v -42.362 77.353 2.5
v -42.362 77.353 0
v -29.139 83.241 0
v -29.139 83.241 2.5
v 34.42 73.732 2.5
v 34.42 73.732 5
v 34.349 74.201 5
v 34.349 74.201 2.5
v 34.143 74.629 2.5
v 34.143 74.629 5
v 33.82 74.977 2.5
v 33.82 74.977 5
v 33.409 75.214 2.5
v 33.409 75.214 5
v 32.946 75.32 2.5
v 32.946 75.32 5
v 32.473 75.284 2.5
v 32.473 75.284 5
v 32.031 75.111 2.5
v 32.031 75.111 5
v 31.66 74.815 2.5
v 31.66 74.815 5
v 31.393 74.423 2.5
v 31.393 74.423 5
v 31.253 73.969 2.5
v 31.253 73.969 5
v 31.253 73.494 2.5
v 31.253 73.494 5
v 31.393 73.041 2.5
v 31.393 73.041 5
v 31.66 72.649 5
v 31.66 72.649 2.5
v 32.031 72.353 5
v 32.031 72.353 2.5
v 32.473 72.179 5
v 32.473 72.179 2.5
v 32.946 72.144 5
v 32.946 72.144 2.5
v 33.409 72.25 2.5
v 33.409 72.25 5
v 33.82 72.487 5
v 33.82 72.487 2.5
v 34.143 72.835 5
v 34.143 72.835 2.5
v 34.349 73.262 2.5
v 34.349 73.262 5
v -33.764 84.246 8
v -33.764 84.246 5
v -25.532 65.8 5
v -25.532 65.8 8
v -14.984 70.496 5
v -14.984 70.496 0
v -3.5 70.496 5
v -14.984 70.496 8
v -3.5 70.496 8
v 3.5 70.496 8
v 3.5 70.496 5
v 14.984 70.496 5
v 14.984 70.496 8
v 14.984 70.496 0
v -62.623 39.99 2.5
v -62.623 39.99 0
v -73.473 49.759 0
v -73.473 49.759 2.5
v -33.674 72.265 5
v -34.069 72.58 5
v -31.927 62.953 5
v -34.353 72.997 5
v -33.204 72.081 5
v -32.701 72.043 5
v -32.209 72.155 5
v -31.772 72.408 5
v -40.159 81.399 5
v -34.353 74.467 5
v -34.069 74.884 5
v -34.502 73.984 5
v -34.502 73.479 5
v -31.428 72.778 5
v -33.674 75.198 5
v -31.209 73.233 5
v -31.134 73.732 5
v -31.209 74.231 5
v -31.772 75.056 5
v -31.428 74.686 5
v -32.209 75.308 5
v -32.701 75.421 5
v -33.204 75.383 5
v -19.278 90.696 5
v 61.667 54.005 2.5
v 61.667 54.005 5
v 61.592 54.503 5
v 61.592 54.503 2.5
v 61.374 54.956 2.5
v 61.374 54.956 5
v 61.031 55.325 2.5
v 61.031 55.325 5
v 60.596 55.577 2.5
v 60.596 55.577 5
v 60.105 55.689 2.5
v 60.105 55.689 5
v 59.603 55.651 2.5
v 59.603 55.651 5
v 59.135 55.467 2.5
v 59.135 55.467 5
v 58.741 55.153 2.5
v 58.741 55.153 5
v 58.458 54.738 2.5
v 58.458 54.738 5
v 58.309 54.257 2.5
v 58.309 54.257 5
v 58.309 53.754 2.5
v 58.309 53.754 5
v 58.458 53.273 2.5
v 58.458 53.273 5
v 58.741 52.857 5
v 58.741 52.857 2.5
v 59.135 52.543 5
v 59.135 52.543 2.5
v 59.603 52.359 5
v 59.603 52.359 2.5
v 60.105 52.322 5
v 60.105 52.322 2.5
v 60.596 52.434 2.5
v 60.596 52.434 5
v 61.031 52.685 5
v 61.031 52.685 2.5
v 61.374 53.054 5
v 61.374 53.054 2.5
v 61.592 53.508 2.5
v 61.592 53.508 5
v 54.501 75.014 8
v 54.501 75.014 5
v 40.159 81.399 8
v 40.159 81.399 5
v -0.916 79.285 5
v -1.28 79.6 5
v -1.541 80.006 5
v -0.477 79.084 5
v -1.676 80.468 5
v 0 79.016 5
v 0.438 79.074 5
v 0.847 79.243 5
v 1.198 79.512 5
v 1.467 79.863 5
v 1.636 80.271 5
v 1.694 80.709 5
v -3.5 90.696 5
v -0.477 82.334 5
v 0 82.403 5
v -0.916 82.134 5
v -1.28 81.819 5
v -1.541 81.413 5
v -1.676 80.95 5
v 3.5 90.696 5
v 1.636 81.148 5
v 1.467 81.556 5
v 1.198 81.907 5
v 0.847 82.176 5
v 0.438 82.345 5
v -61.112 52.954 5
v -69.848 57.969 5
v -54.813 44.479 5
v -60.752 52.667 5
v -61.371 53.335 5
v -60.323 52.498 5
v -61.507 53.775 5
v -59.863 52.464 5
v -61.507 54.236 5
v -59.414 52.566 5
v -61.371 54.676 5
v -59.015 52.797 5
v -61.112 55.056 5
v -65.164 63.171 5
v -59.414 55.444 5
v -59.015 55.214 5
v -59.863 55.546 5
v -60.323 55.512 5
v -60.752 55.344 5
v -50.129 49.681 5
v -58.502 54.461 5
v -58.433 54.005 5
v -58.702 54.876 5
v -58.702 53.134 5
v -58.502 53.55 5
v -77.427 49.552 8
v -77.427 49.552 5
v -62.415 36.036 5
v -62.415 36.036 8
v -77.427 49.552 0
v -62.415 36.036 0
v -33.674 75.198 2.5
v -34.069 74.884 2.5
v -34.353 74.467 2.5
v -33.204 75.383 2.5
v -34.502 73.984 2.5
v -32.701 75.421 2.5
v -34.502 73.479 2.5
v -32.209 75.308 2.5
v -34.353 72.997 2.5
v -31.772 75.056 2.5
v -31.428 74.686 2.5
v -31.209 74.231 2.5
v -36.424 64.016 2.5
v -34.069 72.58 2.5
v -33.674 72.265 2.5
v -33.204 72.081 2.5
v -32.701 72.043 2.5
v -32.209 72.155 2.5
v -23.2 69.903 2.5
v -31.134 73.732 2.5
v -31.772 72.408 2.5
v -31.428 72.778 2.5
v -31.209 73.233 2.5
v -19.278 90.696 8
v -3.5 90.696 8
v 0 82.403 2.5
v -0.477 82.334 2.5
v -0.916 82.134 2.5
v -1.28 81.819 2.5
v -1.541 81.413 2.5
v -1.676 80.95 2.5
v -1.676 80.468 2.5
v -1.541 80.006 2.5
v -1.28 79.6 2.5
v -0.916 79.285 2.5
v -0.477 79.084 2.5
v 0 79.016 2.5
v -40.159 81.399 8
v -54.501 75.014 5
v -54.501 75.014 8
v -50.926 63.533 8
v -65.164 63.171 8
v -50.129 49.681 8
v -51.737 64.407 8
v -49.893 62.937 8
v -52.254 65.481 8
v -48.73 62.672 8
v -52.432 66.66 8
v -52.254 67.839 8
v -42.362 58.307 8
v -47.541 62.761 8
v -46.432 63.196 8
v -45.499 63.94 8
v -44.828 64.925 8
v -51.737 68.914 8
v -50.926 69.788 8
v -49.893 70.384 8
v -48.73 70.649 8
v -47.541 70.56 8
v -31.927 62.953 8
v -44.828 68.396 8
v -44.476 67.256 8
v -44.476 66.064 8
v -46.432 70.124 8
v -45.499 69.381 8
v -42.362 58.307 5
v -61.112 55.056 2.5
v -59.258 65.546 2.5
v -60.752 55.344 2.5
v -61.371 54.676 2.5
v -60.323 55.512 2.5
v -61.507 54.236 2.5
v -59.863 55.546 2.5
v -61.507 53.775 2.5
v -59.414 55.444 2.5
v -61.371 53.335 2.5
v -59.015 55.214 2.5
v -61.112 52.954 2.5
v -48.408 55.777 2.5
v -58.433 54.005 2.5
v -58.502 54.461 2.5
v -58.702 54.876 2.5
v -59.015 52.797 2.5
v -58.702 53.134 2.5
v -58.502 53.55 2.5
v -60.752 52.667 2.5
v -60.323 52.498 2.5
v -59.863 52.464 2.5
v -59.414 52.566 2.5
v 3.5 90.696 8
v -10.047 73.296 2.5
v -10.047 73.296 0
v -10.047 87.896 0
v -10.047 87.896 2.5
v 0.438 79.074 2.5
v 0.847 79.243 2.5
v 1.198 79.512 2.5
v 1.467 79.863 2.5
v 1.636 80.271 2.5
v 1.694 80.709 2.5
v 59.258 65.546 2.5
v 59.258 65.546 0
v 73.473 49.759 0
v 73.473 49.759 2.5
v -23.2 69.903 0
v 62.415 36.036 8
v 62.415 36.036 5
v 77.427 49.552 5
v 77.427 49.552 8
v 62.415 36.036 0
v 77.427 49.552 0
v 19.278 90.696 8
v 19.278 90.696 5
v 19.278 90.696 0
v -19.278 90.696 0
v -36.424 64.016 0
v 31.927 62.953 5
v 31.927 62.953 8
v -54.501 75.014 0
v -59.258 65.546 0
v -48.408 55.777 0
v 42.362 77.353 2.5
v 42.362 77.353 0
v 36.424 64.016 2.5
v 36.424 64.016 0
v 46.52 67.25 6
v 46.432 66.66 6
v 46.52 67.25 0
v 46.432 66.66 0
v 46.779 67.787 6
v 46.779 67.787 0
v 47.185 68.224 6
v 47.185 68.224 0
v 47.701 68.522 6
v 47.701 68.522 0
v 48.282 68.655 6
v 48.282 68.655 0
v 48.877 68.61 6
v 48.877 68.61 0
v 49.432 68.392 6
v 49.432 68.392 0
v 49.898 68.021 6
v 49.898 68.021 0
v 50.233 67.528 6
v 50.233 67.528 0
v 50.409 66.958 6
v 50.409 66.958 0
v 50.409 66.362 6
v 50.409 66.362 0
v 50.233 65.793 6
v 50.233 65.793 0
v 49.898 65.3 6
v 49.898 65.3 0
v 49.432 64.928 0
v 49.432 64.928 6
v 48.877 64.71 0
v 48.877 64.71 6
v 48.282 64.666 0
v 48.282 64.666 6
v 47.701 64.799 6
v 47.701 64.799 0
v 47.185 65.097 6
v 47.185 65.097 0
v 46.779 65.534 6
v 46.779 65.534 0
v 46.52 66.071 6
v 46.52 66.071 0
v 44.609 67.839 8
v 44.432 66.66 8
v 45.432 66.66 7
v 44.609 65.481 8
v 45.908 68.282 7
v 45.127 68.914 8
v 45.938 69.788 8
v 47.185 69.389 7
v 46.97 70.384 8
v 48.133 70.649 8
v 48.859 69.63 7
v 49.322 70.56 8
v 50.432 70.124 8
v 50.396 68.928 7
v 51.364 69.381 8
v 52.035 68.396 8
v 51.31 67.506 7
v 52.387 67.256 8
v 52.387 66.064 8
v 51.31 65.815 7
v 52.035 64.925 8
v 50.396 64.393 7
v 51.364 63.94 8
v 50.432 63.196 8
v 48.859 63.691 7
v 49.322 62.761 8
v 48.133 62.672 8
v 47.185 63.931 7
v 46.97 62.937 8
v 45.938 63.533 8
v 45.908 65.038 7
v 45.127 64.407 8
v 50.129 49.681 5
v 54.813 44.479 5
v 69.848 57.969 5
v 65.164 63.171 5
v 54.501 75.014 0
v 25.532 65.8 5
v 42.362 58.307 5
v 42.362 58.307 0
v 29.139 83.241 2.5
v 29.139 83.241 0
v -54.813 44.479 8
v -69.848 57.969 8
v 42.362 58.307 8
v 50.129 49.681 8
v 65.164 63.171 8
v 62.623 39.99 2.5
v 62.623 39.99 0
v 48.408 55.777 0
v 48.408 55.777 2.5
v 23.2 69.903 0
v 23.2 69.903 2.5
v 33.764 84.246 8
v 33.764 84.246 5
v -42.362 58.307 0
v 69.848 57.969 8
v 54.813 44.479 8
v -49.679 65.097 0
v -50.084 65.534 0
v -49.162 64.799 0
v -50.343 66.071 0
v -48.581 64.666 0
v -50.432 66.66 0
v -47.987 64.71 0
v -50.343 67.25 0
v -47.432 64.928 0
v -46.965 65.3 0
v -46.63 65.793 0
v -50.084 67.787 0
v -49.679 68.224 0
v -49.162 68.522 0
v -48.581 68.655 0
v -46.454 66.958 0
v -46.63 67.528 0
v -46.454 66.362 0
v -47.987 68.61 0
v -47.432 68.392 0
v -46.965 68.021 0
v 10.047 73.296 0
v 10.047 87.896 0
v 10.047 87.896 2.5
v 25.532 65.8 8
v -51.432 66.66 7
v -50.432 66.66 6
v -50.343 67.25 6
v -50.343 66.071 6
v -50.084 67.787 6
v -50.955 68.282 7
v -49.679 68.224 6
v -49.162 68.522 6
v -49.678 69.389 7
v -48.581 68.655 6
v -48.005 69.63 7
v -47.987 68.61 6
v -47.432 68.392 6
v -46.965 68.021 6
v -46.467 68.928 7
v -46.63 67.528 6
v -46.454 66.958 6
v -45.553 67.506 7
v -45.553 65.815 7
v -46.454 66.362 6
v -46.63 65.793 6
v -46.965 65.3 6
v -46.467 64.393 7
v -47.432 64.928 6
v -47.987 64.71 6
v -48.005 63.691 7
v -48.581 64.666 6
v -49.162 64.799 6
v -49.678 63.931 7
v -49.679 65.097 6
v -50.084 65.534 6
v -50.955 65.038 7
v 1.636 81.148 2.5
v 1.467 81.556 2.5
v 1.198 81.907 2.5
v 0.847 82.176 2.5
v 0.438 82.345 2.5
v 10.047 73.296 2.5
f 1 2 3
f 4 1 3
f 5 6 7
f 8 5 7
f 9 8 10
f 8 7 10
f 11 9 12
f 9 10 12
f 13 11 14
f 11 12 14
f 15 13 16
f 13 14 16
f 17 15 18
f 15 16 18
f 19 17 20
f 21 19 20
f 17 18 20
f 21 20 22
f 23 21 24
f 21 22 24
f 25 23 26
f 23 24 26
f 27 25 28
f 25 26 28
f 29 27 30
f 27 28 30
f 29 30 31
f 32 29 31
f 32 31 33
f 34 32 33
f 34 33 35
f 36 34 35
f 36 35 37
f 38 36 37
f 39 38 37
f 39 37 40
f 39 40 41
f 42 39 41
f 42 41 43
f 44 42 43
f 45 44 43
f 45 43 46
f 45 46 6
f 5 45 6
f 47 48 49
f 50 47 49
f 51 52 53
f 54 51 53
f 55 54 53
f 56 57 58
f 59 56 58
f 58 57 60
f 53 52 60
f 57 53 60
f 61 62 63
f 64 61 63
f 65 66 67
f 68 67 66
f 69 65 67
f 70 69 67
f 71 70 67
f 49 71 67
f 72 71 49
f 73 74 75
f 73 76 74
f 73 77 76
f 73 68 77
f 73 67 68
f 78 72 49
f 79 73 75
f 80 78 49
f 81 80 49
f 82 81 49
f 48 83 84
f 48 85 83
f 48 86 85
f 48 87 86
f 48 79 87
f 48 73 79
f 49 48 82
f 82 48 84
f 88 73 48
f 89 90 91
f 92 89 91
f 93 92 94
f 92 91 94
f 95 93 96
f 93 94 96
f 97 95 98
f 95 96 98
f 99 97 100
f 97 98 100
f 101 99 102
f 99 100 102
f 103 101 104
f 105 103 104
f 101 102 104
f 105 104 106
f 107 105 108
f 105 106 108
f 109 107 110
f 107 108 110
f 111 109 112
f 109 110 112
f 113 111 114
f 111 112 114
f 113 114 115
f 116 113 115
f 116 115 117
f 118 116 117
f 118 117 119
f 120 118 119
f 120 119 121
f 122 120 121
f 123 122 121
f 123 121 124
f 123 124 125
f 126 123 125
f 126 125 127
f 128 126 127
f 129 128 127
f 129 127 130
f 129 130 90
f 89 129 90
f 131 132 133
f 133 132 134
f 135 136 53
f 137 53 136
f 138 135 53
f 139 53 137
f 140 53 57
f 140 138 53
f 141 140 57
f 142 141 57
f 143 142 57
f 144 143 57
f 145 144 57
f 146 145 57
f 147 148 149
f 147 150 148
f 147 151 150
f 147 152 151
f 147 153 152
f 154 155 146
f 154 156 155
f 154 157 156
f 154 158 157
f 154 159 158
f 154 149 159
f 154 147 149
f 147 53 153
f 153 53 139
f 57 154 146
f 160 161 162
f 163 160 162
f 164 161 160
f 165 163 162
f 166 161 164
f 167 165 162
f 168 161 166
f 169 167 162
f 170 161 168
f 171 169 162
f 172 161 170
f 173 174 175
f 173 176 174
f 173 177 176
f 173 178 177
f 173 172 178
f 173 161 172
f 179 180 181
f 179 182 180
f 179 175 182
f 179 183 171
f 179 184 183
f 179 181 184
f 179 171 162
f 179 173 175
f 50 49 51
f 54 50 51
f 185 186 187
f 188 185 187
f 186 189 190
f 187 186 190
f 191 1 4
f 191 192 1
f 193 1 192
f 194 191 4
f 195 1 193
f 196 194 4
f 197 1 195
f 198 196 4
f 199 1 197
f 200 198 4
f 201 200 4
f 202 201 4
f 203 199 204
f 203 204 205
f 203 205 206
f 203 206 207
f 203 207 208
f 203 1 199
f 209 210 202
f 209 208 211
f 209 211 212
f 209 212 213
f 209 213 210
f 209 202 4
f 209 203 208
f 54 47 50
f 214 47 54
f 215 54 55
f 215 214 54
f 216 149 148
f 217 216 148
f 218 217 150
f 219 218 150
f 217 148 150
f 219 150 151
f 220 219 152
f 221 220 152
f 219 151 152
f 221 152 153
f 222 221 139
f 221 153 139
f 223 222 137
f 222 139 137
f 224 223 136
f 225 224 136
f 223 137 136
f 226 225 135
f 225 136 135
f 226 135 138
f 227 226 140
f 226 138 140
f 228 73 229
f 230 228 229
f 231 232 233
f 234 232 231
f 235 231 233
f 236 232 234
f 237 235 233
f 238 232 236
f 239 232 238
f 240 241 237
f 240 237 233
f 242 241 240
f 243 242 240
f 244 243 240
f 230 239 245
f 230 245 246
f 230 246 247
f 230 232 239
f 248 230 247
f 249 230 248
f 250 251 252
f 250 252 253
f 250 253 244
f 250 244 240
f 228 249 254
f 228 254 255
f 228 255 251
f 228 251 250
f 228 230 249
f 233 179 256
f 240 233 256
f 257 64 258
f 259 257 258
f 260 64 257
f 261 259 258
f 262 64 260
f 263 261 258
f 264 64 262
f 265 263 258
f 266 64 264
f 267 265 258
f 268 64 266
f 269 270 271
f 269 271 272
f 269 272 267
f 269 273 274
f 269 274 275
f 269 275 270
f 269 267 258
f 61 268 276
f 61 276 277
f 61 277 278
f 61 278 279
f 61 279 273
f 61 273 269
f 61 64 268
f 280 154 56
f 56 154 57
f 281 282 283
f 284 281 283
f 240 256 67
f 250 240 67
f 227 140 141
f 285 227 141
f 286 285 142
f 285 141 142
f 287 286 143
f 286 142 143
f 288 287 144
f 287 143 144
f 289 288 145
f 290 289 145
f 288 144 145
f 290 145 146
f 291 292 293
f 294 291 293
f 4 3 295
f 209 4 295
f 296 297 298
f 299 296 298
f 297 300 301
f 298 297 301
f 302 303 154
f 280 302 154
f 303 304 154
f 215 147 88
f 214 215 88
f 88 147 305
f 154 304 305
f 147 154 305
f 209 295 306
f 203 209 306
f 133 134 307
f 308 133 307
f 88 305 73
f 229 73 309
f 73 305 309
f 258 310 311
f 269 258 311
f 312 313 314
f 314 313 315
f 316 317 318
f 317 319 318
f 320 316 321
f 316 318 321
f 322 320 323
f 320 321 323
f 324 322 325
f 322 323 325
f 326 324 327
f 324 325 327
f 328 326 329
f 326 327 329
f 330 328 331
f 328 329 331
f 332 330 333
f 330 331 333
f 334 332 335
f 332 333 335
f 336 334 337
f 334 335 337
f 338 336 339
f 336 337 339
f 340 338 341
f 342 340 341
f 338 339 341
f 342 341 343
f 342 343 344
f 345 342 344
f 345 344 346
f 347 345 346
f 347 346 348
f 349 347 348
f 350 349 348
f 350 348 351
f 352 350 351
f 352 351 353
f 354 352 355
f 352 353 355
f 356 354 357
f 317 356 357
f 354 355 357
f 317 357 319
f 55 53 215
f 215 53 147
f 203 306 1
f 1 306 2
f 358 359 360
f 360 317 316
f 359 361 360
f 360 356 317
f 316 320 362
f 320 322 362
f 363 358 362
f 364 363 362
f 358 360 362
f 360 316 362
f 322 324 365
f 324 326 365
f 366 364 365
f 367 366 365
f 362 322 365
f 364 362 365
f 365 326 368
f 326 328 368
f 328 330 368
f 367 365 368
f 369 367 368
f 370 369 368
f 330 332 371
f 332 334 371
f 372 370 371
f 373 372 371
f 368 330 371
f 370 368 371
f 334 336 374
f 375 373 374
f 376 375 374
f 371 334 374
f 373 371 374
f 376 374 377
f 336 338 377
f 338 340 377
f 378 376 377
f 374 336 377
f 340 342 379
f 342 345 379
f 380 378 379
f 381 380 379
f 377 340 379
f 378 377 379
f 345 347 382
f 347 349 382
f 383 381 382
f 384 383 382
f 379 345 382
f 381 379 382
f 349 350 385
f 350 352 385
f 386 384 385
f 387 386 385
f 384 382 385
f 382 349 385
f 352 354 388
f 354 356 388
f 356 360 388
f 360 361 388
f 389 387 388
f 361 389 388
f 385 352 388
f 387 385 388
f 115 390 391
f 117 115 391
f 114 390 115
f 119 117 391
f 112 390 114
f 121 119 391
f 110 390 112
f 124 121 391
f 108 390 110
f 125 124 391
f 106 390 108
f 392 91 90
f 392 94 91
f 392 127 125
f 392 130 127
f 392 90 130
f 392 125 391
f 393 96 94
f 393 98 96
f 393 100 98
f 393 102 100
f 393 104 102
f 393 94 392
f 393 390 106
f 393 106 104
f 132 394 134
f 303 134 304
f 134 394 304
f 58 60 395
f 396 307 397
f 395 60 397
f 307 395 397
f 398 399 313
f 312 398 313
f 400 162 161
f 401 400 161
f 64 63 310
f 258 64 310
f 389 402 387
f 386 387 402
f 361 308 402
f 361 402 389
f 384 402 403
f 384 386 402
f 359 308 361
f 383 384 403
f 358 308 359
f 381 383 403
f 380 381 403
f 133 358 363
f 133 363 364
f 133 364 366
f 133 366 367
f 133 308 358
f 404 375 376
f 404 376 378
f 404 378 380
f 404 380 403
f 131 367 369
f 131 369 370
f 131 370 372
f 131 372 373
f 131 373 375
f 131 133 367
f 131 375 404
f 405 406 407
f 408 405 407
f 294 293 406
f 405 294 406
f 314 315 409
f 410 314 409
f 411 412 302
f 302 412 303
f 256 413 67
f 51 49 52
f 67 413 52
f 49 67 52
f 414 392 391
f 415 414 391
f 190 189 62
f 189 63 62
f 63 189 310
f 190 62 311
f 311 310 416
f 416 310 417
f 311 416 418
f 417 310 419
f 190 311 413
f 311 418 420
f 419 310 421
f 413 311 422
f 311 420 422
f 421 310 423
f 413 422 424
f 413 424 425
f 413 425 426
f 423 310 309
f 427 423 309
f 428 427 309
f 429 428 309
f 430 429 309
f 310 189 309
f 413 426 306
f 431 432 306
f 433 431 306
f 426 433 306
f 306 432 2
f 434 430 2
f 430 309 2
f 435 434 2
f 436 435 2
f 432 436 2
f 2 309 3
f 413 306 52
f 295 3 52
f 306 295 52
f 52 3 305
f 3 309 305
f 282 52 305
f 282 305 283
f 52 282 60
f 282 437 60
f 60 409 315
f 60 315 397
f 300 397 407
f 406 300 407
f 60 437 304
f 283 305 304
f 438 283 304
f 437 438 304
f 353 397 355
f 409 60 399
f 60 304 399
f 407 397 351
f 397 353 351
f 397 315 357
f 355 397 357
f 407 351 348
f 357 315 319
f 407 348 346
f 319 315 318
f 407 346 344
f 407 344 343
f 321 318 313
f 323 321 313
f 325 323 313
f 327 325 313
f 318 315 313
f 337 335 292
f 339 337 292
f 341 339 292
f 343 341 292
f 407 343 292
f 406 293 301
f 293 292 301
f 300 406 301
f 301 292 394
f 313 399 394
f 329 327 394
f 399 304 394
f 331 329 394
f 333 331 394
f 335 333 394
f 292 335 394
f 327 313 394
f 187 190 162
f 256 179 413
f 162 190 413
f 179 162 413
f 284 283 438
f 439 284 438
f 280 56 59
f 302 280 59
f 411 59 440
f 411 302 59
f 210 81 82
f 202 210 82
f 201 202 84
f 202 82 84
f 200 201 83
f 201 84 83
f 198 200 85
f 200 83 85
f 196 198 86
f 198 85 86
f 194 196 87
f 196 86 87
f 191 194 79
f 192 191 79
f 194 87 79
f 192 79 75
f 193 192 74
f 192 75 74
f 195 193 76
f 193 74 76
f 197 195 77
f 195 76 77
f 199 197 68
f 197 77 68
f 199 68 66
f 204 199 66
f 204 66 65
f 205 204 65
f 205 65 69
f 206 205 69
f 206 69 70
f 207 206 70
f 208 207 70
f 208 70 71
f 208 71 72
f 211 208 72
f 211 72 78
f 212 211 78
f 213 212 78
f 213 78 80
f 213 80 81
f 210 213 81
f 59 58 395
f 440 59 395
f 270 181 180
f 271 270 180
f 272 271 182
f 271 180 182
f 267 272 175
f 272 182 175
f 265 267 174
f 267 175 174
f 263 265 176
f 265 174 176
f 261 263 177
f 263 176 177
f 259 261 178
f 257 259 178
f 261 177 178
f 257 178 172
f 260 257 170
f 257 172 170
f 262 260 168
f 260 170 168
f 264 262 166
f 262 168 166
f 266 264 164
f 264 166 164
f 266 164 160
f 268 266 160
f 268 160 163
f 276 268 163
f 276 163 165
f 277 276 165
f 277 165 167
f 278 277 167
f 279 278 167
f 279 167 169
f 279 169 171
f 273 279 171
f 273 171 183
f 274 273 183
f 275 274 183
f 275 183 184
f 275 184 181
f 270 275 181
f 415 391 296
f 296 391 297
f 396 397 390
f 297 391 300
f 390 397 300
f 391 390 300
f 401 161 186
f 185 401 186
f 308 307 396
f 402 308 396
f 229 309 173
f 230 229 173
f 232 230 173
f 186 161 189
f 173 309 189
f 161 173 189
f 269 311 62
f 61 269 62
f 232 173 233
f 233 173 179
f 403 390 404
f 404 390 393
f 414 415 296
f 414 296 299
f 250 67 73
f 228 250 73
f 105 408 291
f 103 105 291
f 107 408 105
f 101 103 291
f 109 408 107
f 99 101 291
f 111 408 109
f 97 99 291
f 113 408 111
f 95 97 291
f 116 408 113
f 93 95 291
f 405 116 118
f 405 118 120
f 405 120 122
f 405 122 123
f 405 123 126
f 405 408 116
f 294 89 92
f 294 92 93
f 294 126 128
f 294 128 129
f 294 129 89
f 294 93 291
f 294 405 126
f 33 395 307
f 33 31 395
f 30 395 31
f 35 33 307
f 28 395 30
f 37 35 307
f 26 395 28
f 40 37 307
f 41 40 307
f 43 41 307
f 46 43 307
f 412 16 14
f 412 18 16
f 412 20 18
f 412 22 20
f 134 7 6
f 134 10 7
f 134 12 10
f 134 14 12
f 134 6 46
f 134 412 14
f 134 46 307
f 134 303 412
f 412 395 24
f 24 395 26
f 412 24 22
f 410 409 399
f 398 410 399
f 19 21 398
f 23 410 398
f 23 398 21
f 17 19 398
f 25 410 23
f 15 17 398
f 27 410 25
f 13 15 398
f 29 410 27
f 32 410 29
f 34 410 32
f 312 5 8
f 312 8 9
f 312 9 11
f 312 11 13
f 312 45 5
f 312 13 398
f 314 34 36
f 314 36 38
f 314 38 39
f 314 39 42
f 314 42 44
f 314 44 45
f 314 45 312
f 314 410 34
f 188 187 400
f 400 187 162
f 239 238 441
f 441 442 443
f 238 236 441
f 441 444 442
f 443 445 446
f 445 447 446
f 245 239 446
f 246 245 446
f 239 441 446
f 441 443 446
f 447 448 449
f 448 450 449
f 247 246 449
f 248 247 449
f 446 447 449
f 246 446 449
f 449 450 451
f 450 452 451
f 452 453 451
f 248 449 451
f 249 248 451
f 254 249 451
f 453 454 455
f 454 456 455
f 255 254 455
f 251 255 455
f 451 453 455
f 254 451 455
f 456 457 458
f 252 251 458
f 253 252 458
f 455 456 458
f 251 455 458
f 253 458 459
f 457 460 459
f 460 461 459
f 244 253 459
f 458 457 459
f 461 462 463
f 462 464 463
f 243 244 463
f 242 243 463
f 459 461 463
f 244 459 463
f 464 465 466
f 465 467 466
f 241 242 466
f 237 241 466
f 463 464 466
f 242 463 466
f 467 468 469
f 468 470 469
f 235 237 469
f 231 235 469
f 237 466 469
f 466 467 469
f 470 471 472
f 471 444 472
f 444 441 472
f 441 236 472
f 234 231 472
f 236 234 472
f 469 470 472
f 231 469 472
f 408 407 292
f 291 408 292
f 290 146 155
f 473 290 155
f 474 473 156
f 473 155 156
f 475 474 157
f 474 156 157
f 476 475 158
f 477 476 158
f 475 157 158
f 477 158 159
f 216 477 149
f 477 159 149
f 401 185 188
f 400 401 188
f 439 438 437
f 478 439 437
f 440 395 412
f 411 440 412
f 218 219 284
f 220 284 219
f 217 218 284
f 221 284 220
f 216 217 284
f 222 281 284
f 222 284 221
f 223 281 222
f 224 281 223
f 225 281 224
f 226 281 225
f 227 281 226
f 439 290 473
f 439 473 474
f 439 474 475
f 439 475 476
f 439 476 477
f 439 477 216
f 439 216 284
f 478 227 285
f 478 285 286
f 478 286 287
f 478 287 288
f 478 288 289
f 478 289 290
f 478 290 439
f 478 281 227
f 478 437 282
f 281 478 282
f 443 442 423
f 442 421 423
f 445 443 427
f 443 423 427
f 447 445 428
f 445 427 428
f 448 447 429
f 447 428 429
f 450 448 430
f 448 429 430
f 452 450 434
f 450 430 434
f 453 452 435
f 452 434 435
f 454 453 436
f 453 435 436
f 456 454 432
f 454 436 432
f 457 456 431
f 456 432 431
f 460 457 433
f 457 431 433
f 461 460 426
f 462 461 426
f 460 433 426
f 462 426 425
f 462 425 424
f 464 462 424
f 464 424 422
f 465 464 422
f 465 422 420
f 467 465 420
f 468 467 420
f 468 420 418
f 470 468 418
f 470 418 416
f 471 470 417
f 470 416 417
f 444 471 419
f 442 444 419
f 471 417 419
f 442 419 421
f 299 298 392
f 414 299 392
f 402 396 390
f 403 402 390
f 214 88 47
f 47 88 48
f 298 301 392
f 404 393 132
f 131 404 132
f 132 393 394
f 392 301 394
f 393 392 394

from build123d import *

# Parameters (mm, degrees)
F1_DEPTH       = 5
F3_DEPTH       = 3
F6_D           = 4
F6_CSINK_D     = 8
F6_CSINK_ANGLE = 90
F4_R           = 1.5456356791
F4_R_2         = 1.6934971507
F4_R_3         = 1.5922062155
F4_R_4         = 1.6882702818
F7_DEPTH       = 11.1
F9_DEPTH       = 2.5
F10_R          = 1.4984626167
F11_DEPTH      = 1
F12_R          = 1.6745754143
F13_DEPTH      = 1
F14_W          = 7
F14_H          = 20.1999992132
F14_R          = 1.6202134685
F15_DEPTH      = 1
F16_R          = 1.6358408112
F17_DEPTH      = 1
F18_R          = 1.6662774654
F19_DEPTH      = 1


with BuildPart() as f1:
    # F0 (on Top) → F1 (new body)
    with BuildSketch(Plane.XY):
        Polygon((-42.3623017311, 58.3067062123), (-14.9844143682, 70.4961270094), (14.9844143682, 70.4961270094), (42.3623017311, 58.3067062123), (62.4153622753, 36.0355262112), (77.4268871653, 49.5519639332), (54.5008190929, 75.0139420503), (19.2780567467, 90.6961262226), (-19.2780567467, 90.6961262226), (-54.5008190929, 75.0139420503), (-77.4268871653, 49.5519639332), (-62.4153622753, 36.0355262112), align=None)
    extrude(amount=F1_DEPTH)

    # F2 (on face) → F3 (join)
    with BuildSketch(Plane.XY.offset(5)):
        Polygon((19.2780567467, 90.6961262226), (3.5, 90.6961262226), (3.5, 70.4961270094), (14.9844143682, 70.4961270094), (25.532006503, 65.80003643), (33.7641456248, 84.2464955399), align=None)
        Polygon((-3.5, 70.4961270094), (-3.5, 90.6961262226), (-19.2780567467, 90.6961262226), (-33.7641456248, 84.2464955399), (-25.532006503, 65.80003643), (-14.9844143682, 70.4961270094), align=None)
        Polygon((54.5008190929, 75.0139420503), (40.1589641997, 81.3993472492), (31.9268219148, 62.9528811714), (42.3623017311, 58.3067062123), (50.1289961086, 49.6809182377), (65.1640507517, 63.1712235215), align=None)
        Polygon((77.4268871653, 49.5519639332), (69.8479569532, 57.9692186757), (54.8129021735, 44.4789135438), (62.4153622753, 36.0355262112), align=None)
        Polygon((-31.9268219148, 62.9528811714), (-40.1589641997, 81.3993472492), (-54.5008190929, 75.0139420503), (-65.1640507517, 63.1712235215), (-50.1289961086, 49.6809182377), (-42.3623017311, 58.3067062123), align=None)
        Polygon((-54.8129021735, 44.4789135438), (-69.8479569532, 57.9692186757), (-77.4268871653, 49.5519639332), (-62.4153622753, 36.0355262112), align=None)
    extrude(amount=F3_DEPTH)

    # F6 (through all)
    with Locations(Plane.XY.offset(8)):
        with Locations((-48.431560412, 66.6603241313), (48.431560412, 66.6603241313)):
            CounterSinkHole(F6_D / 2, F6_CSINK_D / 2, counter_sink_angle=F6_CSINK_ANGLE)

    # F4 (on face) → F7 (cut)
    with BuildSketch(Plane.XY.offset(5)):
        with BuildLine():
            ThreePointArc((1.6936241921, 80.7094499469), (1.197573151, 81.9070230979), (0, 82.403074139))
            Line((0, 82.403074139), (0, 79.0158257547))
            ThreePointArc((0, 79.0158257547), (1.197573151, 79.5118767958), (1.6936241921, 80.7094499469))
        make_face()
        with BuildLine():
            Line((0, 79.0158257547), (0, 82.403074139))
            ThreePointArc((0, 82.403074139), (-1.6936241921, 80.7094499469), (0, 79.0158257547))
        make_face()
        with Locations((-59.9788100952, 54.0051631818)):
            Circle(F4_R)
        with Locations((-32.8274907359, 73.7317513878)):
            Circle(F4_R_2)
        with Locations((32.8274907359, 73.7317513878)):
            Circle(F4_R_3)
        with Locations((59.9788100952, 54.0051631818)):
            Circle(F4_R_4)
    extrude(amount=-F7_DEPTH, mode=Mode.SUBTRACT)

    # F8 (on face) → F9 (cut)
    with BuildSketch(Plane(origin=(0, 0, 0), x_dir=(1, 0, 0), z_dir=(0, 0, -1))):
        Polygon((62.6226022883, -39.9899012252), (48.4079691697, -55.7768506604), (59.2578790327, -65.5461533813), (73.4725121513, -49.7592039462), align=None)
        Polygon((23.2004942383, -69.9030770993), (29.1388467156, -83.2408351397), (42.3623017311, -77.3533736479), (36.4239492538, -64.0156156075), align=None)
        Polygon((-10.046819225, -73.2961297035), (-10.046819225, -87.8961235285), (10.046819225, -87.8961235285), (10.046819225, -73.2961297035), (0, -73.2961297035), align=None)
        Polygon((-23.2004942383, -69.9030770993), (-36.4239492538, -64.0156156075), (-42.3623017311, -77.3533736479), (-29.1388467156, -83.2408351397), align=None)
        Polygon((-48.4079691697, -55.7768506604), (-62.6226022883, -39.9899012252), (-73.4725121513, -49.7592039462), (-59.2578790327, -65.5461533813), align=None)
    extrude(amount=-F9_DEPTH, mode=Mode.SUBTRACT)


with BuildPart() as f11:
    # F10 (on face) → F11 (new body)
    with BuildSketch(Plane.XY.offset(5)):
        Polygon((-50.1289961086, 49.6809182377), (-65.1640507517, 63.1712235215), (-69.8479569532, 57.9692186757), (-54.8129021735, 44.4789135438), align=None)
        with Locations((-59.9788100952, 54.0051631818)):
            Circle(F10_R, mode=Mode.SUBTRACT)
    extrude(amount=F11_DEPTH)


with BuildPart() as f13:
    # F12 (on face) → F13 (new body)
    with BuildSketch(Plane.XY.offset(5)):
        Polygon((-25.532006503, 65.80003643), (-33.7641487432, 84.2465025277), (-40.1589641997, 81.3993472492), (-31.9268219148, 62.9528811714), align=None)
        with Locations((-32.8274907359, 73.7317513878)):
            Circle(F12_R, mode=Mode.SUBTRACT)
    extrude(amount=F13_DEPTH)


with BuildPart() as f15:
    # F14 (on face) → F15 (new body)
    with BuildSketch(Plane.XY.offset(5)):
        with Locations((0, 80.596126616)):
            Rectangle(F14_W, F14_H)
        with Locations((0, 80.7094499469)):
            Circle(F14_R, mode=Mode.SUBTRACT)
    extrude(amount=F15_DEPTH)


with BuildPart() as f17:
    # F16 (on face) → F17 (new body)
    with BuildSketch(Plane.XY.offset(5)):
        Polygon((40.1589641997, 81.3993472492), (33.7641487432, 84.2465025277), (25.532006503, 65.80003643), (31.9268219148, 62.9528811714), align=None)
        with Locations((32.8274907359, 73.7317513878)):
            Circle(F16_R, mode=Mode.SUBTRACT)
    extrude(amount=F17_DEPTH)


with BuildPart() as f19:
    # F18 (on face) → F19 (new body)
    with BuildSketch(Plane.XY.offset(5)):
        Polygon((69.8479569532, 57.9692186757), (65.1640507517, 63.1712235215), (50.1289961086, 49.6809182377), (54.8129021735, 44.4789135438), align=None)
        with Locations((59.9788100952, 54.0051631818)):
            Circle(F18_R, mode=Mode.SUBTRACT)
    extrude(amount=F19_DEPTH)


solid = f1.part
